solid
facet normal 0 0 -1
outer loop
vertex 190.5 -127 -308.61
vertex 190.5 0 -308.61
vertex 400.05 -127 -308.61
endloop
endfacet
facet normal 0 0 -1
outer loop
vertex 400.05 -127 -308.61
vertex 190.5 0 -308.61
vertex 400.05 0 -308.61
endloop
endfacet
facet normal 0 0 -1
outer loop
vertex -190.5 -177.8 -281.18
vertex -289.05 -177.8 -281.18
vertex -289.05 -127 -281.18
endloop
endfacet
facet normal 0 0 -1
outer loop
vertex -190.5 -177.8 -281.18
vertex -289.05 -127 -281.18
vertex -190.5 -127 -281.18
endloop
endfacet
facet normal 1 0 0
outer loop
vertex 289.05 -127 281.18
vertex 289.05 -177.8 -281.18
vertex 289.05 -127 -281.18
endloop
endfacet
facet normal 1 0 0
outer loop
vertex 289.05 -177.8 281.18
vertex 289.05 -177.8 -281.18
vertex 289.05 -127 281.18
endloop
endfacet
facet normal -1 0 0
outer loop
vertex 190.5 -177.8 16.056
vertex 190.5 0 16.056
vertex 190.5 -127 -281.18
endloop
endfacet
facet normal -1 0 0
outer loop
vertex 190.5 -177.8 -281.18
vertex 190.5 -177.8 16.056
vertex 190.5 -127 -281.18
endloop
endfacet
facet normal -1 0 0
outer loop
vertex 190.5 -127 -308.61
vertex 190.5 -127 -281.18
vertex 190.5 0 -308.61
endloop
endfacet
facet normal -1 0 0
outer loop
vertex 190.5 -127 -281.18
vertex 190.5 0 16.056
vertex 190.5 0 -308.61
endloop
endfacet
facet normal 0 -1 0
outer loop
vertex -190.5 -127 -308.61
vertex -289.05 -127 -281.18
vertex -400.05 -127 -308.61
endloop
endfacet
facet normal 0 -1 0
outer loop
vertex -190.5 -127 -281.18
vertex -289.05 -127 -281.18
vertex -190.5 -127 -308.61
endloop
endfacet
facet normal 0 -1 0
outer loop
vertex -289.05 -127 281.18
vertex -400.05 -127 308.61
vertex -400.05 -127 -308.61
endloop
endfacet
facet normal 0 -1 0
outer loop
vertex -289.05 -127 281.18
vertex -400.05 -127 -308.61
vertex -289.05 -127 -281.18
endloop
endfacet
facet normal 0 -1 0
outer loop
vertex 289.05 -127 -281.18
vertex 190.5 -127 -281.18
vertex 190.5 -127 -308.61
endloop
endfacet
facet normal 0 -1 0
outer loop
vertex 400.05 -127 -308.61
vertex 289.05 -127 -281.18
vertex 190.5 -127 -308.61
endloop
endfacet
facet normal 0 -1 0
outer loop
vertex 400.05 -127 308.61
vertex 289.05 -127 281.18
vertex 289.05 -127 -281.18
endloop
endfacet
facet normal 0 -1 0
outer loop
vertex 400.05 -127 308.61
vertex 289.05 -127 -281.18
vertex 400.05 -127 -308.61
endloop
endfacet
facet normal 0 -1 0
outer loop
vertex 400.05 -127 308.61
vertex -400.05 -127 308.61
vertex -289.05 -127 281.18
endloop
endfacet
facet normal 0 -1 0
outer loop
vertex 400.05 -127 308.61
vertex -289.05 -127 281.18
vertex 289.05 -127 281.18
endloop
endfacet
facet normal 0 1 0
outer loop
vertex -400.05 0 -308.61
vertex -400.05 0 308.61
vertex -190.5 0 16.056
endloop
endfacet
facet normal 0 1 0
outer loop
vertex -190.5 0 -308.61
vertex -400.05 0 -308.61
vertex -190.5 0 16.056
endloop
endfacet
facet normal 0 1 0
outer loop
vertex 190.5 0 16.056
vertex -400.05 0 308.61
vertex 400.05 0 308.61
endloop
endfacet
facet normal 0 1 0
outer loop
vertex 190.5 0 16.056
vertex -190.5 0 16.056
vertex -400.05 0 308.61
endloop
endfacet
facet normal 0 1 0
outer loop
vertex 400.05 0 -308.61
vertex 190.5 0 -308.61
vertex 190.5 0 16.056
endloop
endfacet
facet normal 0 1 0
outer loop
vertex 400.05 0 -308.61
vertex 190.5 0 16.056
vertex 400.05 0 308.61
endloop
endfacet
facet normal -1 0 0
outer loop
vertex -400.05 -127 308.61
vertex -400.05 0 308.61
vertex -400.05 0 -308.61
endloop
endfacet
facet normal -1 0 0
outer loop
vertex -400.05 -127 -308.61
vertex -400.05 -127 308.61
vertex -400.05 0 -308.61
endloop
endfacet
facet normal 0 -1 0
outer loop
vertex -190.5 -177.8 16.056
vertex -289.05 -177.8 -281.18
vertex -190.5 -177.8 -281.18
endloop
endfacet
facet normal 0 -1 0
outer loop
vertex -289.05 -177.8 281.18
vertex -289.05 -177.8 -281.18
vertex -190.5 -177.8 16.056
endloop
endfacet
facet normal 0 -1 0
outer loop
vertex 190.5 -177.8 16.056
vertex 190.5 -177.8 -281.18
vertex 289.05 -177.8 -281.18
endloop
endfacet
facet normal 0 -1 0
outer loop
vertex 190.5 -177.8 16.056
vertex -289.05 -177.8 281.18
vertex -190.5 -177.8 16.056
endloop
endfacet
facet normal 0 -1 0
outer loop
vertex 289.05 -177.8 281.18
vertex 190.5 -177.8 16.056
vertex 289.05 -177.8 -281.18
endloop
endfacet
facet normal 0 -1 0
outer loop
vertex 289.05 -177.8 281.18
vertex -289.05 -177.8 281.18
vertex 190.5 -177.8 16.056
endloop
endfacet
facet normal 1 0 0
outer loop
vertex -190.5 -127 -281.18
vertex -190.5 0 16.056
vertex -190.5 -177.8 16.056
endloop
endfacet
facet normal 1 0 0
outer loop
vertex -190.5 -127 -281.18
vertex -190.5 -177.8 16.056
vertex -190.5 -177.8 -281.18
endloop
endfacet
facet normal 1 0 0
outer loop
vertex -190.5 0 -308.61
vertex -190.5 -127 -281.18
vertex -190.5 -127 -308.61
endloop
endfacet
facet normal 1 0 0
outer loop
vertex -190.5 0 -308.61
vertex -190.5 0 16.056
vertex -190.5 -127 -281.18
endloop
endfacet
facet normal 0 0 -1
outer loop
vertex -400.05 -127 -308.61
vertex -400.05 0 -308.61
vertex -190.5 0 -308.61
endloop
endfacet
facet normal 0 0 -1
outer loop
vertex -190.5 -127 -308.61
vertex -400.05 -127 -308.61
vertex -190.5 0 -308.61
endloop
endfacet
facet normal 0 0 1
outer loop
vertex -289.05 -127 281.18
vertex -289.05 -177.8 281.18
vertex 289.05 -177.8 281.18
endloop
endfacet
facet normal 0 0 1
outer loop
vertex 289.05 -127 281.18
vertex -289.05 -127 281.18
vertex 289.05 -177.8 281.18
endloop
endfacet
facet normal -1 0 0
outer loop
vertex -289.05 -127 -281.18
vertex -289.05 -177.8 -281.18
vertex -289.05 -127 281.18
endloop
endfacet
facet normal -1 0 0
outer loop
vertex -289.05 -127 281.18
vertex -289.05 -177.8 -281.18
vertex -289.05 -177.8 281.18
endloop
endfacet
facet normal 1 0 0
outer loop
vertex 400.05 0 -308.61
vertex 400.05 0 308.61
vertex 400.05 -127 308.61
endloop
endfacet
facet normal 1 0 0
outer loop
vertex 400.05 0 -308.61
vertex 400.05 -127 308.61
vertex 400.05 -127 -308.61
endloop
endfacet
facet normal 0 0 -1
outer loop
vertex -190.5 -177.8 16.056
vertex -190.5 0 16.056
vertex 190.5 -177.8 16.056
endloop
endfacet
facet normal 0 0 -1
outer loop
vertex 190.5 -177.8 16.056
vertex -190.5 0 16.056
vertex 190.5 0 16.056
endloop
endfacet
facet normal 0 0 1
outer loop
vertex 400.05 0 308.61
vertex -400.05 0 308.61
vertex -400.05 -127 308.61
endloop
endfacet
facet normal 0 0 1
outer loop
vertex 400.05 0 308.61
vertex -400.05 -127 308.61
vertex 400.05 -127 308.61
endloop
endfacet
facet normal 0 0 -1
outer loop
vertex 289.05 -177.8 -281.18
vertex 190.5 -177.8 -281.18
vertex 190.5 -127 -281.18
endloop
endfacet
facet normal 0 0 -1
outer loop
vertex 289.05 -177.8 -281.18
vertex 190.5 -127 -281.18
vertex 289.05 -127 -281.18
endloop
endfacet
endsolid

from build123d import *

# Parameters (mm, degrees)
SKETCH1_W           = 800.1
SKETCH1_H           = 617.22
BOSS_EXTRUDE1_DEPTH = 304.8
SKETCH3_W           = 800.1
SKETCH3_H           = 617.22
SKETCH3_W_2         = 578.099229306
SKETCH3_H_2         = 562.360466338
CUT_EXTRUDE1_DEPTH  = 177.8
SKETCH5_W           = 578.099229306
SKETCH5_H           = 127
CUT_EXTRUDE3_DEPTH  = 776.110031957
SKETCH6_W           = 381
SKETCH6_H           = 324.666103145
CUT_EXTRUDE4_DEPTH  = 536.623911527


with BuildPart() as part:
    # Sketch1 → Boss-Extrude1 (new body)
    with BuildSketch(Plane(origin=(0, 0, 0), x_dir=(1, 0, 0), z_dir=(0, 1, 0))):
        Rectangle(SKETCH1_W, SKETCH1_H)
    extrude(amount=-BOSS_EXTRUDE1_DEPTH)

    # Sketch3 → Cut-Extrude1 (cut)
    with BuildSketch(Plane.XZ.offset(304.8)):
        Rectangle(SKETCH3_W, SKETCH3_H)
        Rectangle(SKETCH3_W_2, SKETCH3_H_2, mode=Mode.SUBTRACT)
    extrude(amount=-CUT_EXTRUDE1_DEPTH, mode=Mode.SUBTRACT)

    # Sketch5 → Cut-Extrude3 (cut, through all)
    with BuildSketch(Plane.XY.offset(281.180233169)):
        with Locations((0, -241.3)):
            Rectangle(SKETCH5_W, SKETCH5_H)
    extrude(amount=-CUT_EXTRUDE3_DEPTH, mode=Mode.SUBTRACT)

    # Sketch6 → Cut-Extrude4 (cut, through all)
    with BuildSketch(Plane(origin=(0, 0, 0), x_dir=(1, 0, 0), z_dir=(0, 1, 0))):
        with Locations((0, 146.276948428)):
            Rectangle(SKETCH6_W, SKETCH6_H)
    extrude(amount=-CUT_EXTRUDE4_DEPTH, mode=Mode.SUBTRACT)


solid = part.part
